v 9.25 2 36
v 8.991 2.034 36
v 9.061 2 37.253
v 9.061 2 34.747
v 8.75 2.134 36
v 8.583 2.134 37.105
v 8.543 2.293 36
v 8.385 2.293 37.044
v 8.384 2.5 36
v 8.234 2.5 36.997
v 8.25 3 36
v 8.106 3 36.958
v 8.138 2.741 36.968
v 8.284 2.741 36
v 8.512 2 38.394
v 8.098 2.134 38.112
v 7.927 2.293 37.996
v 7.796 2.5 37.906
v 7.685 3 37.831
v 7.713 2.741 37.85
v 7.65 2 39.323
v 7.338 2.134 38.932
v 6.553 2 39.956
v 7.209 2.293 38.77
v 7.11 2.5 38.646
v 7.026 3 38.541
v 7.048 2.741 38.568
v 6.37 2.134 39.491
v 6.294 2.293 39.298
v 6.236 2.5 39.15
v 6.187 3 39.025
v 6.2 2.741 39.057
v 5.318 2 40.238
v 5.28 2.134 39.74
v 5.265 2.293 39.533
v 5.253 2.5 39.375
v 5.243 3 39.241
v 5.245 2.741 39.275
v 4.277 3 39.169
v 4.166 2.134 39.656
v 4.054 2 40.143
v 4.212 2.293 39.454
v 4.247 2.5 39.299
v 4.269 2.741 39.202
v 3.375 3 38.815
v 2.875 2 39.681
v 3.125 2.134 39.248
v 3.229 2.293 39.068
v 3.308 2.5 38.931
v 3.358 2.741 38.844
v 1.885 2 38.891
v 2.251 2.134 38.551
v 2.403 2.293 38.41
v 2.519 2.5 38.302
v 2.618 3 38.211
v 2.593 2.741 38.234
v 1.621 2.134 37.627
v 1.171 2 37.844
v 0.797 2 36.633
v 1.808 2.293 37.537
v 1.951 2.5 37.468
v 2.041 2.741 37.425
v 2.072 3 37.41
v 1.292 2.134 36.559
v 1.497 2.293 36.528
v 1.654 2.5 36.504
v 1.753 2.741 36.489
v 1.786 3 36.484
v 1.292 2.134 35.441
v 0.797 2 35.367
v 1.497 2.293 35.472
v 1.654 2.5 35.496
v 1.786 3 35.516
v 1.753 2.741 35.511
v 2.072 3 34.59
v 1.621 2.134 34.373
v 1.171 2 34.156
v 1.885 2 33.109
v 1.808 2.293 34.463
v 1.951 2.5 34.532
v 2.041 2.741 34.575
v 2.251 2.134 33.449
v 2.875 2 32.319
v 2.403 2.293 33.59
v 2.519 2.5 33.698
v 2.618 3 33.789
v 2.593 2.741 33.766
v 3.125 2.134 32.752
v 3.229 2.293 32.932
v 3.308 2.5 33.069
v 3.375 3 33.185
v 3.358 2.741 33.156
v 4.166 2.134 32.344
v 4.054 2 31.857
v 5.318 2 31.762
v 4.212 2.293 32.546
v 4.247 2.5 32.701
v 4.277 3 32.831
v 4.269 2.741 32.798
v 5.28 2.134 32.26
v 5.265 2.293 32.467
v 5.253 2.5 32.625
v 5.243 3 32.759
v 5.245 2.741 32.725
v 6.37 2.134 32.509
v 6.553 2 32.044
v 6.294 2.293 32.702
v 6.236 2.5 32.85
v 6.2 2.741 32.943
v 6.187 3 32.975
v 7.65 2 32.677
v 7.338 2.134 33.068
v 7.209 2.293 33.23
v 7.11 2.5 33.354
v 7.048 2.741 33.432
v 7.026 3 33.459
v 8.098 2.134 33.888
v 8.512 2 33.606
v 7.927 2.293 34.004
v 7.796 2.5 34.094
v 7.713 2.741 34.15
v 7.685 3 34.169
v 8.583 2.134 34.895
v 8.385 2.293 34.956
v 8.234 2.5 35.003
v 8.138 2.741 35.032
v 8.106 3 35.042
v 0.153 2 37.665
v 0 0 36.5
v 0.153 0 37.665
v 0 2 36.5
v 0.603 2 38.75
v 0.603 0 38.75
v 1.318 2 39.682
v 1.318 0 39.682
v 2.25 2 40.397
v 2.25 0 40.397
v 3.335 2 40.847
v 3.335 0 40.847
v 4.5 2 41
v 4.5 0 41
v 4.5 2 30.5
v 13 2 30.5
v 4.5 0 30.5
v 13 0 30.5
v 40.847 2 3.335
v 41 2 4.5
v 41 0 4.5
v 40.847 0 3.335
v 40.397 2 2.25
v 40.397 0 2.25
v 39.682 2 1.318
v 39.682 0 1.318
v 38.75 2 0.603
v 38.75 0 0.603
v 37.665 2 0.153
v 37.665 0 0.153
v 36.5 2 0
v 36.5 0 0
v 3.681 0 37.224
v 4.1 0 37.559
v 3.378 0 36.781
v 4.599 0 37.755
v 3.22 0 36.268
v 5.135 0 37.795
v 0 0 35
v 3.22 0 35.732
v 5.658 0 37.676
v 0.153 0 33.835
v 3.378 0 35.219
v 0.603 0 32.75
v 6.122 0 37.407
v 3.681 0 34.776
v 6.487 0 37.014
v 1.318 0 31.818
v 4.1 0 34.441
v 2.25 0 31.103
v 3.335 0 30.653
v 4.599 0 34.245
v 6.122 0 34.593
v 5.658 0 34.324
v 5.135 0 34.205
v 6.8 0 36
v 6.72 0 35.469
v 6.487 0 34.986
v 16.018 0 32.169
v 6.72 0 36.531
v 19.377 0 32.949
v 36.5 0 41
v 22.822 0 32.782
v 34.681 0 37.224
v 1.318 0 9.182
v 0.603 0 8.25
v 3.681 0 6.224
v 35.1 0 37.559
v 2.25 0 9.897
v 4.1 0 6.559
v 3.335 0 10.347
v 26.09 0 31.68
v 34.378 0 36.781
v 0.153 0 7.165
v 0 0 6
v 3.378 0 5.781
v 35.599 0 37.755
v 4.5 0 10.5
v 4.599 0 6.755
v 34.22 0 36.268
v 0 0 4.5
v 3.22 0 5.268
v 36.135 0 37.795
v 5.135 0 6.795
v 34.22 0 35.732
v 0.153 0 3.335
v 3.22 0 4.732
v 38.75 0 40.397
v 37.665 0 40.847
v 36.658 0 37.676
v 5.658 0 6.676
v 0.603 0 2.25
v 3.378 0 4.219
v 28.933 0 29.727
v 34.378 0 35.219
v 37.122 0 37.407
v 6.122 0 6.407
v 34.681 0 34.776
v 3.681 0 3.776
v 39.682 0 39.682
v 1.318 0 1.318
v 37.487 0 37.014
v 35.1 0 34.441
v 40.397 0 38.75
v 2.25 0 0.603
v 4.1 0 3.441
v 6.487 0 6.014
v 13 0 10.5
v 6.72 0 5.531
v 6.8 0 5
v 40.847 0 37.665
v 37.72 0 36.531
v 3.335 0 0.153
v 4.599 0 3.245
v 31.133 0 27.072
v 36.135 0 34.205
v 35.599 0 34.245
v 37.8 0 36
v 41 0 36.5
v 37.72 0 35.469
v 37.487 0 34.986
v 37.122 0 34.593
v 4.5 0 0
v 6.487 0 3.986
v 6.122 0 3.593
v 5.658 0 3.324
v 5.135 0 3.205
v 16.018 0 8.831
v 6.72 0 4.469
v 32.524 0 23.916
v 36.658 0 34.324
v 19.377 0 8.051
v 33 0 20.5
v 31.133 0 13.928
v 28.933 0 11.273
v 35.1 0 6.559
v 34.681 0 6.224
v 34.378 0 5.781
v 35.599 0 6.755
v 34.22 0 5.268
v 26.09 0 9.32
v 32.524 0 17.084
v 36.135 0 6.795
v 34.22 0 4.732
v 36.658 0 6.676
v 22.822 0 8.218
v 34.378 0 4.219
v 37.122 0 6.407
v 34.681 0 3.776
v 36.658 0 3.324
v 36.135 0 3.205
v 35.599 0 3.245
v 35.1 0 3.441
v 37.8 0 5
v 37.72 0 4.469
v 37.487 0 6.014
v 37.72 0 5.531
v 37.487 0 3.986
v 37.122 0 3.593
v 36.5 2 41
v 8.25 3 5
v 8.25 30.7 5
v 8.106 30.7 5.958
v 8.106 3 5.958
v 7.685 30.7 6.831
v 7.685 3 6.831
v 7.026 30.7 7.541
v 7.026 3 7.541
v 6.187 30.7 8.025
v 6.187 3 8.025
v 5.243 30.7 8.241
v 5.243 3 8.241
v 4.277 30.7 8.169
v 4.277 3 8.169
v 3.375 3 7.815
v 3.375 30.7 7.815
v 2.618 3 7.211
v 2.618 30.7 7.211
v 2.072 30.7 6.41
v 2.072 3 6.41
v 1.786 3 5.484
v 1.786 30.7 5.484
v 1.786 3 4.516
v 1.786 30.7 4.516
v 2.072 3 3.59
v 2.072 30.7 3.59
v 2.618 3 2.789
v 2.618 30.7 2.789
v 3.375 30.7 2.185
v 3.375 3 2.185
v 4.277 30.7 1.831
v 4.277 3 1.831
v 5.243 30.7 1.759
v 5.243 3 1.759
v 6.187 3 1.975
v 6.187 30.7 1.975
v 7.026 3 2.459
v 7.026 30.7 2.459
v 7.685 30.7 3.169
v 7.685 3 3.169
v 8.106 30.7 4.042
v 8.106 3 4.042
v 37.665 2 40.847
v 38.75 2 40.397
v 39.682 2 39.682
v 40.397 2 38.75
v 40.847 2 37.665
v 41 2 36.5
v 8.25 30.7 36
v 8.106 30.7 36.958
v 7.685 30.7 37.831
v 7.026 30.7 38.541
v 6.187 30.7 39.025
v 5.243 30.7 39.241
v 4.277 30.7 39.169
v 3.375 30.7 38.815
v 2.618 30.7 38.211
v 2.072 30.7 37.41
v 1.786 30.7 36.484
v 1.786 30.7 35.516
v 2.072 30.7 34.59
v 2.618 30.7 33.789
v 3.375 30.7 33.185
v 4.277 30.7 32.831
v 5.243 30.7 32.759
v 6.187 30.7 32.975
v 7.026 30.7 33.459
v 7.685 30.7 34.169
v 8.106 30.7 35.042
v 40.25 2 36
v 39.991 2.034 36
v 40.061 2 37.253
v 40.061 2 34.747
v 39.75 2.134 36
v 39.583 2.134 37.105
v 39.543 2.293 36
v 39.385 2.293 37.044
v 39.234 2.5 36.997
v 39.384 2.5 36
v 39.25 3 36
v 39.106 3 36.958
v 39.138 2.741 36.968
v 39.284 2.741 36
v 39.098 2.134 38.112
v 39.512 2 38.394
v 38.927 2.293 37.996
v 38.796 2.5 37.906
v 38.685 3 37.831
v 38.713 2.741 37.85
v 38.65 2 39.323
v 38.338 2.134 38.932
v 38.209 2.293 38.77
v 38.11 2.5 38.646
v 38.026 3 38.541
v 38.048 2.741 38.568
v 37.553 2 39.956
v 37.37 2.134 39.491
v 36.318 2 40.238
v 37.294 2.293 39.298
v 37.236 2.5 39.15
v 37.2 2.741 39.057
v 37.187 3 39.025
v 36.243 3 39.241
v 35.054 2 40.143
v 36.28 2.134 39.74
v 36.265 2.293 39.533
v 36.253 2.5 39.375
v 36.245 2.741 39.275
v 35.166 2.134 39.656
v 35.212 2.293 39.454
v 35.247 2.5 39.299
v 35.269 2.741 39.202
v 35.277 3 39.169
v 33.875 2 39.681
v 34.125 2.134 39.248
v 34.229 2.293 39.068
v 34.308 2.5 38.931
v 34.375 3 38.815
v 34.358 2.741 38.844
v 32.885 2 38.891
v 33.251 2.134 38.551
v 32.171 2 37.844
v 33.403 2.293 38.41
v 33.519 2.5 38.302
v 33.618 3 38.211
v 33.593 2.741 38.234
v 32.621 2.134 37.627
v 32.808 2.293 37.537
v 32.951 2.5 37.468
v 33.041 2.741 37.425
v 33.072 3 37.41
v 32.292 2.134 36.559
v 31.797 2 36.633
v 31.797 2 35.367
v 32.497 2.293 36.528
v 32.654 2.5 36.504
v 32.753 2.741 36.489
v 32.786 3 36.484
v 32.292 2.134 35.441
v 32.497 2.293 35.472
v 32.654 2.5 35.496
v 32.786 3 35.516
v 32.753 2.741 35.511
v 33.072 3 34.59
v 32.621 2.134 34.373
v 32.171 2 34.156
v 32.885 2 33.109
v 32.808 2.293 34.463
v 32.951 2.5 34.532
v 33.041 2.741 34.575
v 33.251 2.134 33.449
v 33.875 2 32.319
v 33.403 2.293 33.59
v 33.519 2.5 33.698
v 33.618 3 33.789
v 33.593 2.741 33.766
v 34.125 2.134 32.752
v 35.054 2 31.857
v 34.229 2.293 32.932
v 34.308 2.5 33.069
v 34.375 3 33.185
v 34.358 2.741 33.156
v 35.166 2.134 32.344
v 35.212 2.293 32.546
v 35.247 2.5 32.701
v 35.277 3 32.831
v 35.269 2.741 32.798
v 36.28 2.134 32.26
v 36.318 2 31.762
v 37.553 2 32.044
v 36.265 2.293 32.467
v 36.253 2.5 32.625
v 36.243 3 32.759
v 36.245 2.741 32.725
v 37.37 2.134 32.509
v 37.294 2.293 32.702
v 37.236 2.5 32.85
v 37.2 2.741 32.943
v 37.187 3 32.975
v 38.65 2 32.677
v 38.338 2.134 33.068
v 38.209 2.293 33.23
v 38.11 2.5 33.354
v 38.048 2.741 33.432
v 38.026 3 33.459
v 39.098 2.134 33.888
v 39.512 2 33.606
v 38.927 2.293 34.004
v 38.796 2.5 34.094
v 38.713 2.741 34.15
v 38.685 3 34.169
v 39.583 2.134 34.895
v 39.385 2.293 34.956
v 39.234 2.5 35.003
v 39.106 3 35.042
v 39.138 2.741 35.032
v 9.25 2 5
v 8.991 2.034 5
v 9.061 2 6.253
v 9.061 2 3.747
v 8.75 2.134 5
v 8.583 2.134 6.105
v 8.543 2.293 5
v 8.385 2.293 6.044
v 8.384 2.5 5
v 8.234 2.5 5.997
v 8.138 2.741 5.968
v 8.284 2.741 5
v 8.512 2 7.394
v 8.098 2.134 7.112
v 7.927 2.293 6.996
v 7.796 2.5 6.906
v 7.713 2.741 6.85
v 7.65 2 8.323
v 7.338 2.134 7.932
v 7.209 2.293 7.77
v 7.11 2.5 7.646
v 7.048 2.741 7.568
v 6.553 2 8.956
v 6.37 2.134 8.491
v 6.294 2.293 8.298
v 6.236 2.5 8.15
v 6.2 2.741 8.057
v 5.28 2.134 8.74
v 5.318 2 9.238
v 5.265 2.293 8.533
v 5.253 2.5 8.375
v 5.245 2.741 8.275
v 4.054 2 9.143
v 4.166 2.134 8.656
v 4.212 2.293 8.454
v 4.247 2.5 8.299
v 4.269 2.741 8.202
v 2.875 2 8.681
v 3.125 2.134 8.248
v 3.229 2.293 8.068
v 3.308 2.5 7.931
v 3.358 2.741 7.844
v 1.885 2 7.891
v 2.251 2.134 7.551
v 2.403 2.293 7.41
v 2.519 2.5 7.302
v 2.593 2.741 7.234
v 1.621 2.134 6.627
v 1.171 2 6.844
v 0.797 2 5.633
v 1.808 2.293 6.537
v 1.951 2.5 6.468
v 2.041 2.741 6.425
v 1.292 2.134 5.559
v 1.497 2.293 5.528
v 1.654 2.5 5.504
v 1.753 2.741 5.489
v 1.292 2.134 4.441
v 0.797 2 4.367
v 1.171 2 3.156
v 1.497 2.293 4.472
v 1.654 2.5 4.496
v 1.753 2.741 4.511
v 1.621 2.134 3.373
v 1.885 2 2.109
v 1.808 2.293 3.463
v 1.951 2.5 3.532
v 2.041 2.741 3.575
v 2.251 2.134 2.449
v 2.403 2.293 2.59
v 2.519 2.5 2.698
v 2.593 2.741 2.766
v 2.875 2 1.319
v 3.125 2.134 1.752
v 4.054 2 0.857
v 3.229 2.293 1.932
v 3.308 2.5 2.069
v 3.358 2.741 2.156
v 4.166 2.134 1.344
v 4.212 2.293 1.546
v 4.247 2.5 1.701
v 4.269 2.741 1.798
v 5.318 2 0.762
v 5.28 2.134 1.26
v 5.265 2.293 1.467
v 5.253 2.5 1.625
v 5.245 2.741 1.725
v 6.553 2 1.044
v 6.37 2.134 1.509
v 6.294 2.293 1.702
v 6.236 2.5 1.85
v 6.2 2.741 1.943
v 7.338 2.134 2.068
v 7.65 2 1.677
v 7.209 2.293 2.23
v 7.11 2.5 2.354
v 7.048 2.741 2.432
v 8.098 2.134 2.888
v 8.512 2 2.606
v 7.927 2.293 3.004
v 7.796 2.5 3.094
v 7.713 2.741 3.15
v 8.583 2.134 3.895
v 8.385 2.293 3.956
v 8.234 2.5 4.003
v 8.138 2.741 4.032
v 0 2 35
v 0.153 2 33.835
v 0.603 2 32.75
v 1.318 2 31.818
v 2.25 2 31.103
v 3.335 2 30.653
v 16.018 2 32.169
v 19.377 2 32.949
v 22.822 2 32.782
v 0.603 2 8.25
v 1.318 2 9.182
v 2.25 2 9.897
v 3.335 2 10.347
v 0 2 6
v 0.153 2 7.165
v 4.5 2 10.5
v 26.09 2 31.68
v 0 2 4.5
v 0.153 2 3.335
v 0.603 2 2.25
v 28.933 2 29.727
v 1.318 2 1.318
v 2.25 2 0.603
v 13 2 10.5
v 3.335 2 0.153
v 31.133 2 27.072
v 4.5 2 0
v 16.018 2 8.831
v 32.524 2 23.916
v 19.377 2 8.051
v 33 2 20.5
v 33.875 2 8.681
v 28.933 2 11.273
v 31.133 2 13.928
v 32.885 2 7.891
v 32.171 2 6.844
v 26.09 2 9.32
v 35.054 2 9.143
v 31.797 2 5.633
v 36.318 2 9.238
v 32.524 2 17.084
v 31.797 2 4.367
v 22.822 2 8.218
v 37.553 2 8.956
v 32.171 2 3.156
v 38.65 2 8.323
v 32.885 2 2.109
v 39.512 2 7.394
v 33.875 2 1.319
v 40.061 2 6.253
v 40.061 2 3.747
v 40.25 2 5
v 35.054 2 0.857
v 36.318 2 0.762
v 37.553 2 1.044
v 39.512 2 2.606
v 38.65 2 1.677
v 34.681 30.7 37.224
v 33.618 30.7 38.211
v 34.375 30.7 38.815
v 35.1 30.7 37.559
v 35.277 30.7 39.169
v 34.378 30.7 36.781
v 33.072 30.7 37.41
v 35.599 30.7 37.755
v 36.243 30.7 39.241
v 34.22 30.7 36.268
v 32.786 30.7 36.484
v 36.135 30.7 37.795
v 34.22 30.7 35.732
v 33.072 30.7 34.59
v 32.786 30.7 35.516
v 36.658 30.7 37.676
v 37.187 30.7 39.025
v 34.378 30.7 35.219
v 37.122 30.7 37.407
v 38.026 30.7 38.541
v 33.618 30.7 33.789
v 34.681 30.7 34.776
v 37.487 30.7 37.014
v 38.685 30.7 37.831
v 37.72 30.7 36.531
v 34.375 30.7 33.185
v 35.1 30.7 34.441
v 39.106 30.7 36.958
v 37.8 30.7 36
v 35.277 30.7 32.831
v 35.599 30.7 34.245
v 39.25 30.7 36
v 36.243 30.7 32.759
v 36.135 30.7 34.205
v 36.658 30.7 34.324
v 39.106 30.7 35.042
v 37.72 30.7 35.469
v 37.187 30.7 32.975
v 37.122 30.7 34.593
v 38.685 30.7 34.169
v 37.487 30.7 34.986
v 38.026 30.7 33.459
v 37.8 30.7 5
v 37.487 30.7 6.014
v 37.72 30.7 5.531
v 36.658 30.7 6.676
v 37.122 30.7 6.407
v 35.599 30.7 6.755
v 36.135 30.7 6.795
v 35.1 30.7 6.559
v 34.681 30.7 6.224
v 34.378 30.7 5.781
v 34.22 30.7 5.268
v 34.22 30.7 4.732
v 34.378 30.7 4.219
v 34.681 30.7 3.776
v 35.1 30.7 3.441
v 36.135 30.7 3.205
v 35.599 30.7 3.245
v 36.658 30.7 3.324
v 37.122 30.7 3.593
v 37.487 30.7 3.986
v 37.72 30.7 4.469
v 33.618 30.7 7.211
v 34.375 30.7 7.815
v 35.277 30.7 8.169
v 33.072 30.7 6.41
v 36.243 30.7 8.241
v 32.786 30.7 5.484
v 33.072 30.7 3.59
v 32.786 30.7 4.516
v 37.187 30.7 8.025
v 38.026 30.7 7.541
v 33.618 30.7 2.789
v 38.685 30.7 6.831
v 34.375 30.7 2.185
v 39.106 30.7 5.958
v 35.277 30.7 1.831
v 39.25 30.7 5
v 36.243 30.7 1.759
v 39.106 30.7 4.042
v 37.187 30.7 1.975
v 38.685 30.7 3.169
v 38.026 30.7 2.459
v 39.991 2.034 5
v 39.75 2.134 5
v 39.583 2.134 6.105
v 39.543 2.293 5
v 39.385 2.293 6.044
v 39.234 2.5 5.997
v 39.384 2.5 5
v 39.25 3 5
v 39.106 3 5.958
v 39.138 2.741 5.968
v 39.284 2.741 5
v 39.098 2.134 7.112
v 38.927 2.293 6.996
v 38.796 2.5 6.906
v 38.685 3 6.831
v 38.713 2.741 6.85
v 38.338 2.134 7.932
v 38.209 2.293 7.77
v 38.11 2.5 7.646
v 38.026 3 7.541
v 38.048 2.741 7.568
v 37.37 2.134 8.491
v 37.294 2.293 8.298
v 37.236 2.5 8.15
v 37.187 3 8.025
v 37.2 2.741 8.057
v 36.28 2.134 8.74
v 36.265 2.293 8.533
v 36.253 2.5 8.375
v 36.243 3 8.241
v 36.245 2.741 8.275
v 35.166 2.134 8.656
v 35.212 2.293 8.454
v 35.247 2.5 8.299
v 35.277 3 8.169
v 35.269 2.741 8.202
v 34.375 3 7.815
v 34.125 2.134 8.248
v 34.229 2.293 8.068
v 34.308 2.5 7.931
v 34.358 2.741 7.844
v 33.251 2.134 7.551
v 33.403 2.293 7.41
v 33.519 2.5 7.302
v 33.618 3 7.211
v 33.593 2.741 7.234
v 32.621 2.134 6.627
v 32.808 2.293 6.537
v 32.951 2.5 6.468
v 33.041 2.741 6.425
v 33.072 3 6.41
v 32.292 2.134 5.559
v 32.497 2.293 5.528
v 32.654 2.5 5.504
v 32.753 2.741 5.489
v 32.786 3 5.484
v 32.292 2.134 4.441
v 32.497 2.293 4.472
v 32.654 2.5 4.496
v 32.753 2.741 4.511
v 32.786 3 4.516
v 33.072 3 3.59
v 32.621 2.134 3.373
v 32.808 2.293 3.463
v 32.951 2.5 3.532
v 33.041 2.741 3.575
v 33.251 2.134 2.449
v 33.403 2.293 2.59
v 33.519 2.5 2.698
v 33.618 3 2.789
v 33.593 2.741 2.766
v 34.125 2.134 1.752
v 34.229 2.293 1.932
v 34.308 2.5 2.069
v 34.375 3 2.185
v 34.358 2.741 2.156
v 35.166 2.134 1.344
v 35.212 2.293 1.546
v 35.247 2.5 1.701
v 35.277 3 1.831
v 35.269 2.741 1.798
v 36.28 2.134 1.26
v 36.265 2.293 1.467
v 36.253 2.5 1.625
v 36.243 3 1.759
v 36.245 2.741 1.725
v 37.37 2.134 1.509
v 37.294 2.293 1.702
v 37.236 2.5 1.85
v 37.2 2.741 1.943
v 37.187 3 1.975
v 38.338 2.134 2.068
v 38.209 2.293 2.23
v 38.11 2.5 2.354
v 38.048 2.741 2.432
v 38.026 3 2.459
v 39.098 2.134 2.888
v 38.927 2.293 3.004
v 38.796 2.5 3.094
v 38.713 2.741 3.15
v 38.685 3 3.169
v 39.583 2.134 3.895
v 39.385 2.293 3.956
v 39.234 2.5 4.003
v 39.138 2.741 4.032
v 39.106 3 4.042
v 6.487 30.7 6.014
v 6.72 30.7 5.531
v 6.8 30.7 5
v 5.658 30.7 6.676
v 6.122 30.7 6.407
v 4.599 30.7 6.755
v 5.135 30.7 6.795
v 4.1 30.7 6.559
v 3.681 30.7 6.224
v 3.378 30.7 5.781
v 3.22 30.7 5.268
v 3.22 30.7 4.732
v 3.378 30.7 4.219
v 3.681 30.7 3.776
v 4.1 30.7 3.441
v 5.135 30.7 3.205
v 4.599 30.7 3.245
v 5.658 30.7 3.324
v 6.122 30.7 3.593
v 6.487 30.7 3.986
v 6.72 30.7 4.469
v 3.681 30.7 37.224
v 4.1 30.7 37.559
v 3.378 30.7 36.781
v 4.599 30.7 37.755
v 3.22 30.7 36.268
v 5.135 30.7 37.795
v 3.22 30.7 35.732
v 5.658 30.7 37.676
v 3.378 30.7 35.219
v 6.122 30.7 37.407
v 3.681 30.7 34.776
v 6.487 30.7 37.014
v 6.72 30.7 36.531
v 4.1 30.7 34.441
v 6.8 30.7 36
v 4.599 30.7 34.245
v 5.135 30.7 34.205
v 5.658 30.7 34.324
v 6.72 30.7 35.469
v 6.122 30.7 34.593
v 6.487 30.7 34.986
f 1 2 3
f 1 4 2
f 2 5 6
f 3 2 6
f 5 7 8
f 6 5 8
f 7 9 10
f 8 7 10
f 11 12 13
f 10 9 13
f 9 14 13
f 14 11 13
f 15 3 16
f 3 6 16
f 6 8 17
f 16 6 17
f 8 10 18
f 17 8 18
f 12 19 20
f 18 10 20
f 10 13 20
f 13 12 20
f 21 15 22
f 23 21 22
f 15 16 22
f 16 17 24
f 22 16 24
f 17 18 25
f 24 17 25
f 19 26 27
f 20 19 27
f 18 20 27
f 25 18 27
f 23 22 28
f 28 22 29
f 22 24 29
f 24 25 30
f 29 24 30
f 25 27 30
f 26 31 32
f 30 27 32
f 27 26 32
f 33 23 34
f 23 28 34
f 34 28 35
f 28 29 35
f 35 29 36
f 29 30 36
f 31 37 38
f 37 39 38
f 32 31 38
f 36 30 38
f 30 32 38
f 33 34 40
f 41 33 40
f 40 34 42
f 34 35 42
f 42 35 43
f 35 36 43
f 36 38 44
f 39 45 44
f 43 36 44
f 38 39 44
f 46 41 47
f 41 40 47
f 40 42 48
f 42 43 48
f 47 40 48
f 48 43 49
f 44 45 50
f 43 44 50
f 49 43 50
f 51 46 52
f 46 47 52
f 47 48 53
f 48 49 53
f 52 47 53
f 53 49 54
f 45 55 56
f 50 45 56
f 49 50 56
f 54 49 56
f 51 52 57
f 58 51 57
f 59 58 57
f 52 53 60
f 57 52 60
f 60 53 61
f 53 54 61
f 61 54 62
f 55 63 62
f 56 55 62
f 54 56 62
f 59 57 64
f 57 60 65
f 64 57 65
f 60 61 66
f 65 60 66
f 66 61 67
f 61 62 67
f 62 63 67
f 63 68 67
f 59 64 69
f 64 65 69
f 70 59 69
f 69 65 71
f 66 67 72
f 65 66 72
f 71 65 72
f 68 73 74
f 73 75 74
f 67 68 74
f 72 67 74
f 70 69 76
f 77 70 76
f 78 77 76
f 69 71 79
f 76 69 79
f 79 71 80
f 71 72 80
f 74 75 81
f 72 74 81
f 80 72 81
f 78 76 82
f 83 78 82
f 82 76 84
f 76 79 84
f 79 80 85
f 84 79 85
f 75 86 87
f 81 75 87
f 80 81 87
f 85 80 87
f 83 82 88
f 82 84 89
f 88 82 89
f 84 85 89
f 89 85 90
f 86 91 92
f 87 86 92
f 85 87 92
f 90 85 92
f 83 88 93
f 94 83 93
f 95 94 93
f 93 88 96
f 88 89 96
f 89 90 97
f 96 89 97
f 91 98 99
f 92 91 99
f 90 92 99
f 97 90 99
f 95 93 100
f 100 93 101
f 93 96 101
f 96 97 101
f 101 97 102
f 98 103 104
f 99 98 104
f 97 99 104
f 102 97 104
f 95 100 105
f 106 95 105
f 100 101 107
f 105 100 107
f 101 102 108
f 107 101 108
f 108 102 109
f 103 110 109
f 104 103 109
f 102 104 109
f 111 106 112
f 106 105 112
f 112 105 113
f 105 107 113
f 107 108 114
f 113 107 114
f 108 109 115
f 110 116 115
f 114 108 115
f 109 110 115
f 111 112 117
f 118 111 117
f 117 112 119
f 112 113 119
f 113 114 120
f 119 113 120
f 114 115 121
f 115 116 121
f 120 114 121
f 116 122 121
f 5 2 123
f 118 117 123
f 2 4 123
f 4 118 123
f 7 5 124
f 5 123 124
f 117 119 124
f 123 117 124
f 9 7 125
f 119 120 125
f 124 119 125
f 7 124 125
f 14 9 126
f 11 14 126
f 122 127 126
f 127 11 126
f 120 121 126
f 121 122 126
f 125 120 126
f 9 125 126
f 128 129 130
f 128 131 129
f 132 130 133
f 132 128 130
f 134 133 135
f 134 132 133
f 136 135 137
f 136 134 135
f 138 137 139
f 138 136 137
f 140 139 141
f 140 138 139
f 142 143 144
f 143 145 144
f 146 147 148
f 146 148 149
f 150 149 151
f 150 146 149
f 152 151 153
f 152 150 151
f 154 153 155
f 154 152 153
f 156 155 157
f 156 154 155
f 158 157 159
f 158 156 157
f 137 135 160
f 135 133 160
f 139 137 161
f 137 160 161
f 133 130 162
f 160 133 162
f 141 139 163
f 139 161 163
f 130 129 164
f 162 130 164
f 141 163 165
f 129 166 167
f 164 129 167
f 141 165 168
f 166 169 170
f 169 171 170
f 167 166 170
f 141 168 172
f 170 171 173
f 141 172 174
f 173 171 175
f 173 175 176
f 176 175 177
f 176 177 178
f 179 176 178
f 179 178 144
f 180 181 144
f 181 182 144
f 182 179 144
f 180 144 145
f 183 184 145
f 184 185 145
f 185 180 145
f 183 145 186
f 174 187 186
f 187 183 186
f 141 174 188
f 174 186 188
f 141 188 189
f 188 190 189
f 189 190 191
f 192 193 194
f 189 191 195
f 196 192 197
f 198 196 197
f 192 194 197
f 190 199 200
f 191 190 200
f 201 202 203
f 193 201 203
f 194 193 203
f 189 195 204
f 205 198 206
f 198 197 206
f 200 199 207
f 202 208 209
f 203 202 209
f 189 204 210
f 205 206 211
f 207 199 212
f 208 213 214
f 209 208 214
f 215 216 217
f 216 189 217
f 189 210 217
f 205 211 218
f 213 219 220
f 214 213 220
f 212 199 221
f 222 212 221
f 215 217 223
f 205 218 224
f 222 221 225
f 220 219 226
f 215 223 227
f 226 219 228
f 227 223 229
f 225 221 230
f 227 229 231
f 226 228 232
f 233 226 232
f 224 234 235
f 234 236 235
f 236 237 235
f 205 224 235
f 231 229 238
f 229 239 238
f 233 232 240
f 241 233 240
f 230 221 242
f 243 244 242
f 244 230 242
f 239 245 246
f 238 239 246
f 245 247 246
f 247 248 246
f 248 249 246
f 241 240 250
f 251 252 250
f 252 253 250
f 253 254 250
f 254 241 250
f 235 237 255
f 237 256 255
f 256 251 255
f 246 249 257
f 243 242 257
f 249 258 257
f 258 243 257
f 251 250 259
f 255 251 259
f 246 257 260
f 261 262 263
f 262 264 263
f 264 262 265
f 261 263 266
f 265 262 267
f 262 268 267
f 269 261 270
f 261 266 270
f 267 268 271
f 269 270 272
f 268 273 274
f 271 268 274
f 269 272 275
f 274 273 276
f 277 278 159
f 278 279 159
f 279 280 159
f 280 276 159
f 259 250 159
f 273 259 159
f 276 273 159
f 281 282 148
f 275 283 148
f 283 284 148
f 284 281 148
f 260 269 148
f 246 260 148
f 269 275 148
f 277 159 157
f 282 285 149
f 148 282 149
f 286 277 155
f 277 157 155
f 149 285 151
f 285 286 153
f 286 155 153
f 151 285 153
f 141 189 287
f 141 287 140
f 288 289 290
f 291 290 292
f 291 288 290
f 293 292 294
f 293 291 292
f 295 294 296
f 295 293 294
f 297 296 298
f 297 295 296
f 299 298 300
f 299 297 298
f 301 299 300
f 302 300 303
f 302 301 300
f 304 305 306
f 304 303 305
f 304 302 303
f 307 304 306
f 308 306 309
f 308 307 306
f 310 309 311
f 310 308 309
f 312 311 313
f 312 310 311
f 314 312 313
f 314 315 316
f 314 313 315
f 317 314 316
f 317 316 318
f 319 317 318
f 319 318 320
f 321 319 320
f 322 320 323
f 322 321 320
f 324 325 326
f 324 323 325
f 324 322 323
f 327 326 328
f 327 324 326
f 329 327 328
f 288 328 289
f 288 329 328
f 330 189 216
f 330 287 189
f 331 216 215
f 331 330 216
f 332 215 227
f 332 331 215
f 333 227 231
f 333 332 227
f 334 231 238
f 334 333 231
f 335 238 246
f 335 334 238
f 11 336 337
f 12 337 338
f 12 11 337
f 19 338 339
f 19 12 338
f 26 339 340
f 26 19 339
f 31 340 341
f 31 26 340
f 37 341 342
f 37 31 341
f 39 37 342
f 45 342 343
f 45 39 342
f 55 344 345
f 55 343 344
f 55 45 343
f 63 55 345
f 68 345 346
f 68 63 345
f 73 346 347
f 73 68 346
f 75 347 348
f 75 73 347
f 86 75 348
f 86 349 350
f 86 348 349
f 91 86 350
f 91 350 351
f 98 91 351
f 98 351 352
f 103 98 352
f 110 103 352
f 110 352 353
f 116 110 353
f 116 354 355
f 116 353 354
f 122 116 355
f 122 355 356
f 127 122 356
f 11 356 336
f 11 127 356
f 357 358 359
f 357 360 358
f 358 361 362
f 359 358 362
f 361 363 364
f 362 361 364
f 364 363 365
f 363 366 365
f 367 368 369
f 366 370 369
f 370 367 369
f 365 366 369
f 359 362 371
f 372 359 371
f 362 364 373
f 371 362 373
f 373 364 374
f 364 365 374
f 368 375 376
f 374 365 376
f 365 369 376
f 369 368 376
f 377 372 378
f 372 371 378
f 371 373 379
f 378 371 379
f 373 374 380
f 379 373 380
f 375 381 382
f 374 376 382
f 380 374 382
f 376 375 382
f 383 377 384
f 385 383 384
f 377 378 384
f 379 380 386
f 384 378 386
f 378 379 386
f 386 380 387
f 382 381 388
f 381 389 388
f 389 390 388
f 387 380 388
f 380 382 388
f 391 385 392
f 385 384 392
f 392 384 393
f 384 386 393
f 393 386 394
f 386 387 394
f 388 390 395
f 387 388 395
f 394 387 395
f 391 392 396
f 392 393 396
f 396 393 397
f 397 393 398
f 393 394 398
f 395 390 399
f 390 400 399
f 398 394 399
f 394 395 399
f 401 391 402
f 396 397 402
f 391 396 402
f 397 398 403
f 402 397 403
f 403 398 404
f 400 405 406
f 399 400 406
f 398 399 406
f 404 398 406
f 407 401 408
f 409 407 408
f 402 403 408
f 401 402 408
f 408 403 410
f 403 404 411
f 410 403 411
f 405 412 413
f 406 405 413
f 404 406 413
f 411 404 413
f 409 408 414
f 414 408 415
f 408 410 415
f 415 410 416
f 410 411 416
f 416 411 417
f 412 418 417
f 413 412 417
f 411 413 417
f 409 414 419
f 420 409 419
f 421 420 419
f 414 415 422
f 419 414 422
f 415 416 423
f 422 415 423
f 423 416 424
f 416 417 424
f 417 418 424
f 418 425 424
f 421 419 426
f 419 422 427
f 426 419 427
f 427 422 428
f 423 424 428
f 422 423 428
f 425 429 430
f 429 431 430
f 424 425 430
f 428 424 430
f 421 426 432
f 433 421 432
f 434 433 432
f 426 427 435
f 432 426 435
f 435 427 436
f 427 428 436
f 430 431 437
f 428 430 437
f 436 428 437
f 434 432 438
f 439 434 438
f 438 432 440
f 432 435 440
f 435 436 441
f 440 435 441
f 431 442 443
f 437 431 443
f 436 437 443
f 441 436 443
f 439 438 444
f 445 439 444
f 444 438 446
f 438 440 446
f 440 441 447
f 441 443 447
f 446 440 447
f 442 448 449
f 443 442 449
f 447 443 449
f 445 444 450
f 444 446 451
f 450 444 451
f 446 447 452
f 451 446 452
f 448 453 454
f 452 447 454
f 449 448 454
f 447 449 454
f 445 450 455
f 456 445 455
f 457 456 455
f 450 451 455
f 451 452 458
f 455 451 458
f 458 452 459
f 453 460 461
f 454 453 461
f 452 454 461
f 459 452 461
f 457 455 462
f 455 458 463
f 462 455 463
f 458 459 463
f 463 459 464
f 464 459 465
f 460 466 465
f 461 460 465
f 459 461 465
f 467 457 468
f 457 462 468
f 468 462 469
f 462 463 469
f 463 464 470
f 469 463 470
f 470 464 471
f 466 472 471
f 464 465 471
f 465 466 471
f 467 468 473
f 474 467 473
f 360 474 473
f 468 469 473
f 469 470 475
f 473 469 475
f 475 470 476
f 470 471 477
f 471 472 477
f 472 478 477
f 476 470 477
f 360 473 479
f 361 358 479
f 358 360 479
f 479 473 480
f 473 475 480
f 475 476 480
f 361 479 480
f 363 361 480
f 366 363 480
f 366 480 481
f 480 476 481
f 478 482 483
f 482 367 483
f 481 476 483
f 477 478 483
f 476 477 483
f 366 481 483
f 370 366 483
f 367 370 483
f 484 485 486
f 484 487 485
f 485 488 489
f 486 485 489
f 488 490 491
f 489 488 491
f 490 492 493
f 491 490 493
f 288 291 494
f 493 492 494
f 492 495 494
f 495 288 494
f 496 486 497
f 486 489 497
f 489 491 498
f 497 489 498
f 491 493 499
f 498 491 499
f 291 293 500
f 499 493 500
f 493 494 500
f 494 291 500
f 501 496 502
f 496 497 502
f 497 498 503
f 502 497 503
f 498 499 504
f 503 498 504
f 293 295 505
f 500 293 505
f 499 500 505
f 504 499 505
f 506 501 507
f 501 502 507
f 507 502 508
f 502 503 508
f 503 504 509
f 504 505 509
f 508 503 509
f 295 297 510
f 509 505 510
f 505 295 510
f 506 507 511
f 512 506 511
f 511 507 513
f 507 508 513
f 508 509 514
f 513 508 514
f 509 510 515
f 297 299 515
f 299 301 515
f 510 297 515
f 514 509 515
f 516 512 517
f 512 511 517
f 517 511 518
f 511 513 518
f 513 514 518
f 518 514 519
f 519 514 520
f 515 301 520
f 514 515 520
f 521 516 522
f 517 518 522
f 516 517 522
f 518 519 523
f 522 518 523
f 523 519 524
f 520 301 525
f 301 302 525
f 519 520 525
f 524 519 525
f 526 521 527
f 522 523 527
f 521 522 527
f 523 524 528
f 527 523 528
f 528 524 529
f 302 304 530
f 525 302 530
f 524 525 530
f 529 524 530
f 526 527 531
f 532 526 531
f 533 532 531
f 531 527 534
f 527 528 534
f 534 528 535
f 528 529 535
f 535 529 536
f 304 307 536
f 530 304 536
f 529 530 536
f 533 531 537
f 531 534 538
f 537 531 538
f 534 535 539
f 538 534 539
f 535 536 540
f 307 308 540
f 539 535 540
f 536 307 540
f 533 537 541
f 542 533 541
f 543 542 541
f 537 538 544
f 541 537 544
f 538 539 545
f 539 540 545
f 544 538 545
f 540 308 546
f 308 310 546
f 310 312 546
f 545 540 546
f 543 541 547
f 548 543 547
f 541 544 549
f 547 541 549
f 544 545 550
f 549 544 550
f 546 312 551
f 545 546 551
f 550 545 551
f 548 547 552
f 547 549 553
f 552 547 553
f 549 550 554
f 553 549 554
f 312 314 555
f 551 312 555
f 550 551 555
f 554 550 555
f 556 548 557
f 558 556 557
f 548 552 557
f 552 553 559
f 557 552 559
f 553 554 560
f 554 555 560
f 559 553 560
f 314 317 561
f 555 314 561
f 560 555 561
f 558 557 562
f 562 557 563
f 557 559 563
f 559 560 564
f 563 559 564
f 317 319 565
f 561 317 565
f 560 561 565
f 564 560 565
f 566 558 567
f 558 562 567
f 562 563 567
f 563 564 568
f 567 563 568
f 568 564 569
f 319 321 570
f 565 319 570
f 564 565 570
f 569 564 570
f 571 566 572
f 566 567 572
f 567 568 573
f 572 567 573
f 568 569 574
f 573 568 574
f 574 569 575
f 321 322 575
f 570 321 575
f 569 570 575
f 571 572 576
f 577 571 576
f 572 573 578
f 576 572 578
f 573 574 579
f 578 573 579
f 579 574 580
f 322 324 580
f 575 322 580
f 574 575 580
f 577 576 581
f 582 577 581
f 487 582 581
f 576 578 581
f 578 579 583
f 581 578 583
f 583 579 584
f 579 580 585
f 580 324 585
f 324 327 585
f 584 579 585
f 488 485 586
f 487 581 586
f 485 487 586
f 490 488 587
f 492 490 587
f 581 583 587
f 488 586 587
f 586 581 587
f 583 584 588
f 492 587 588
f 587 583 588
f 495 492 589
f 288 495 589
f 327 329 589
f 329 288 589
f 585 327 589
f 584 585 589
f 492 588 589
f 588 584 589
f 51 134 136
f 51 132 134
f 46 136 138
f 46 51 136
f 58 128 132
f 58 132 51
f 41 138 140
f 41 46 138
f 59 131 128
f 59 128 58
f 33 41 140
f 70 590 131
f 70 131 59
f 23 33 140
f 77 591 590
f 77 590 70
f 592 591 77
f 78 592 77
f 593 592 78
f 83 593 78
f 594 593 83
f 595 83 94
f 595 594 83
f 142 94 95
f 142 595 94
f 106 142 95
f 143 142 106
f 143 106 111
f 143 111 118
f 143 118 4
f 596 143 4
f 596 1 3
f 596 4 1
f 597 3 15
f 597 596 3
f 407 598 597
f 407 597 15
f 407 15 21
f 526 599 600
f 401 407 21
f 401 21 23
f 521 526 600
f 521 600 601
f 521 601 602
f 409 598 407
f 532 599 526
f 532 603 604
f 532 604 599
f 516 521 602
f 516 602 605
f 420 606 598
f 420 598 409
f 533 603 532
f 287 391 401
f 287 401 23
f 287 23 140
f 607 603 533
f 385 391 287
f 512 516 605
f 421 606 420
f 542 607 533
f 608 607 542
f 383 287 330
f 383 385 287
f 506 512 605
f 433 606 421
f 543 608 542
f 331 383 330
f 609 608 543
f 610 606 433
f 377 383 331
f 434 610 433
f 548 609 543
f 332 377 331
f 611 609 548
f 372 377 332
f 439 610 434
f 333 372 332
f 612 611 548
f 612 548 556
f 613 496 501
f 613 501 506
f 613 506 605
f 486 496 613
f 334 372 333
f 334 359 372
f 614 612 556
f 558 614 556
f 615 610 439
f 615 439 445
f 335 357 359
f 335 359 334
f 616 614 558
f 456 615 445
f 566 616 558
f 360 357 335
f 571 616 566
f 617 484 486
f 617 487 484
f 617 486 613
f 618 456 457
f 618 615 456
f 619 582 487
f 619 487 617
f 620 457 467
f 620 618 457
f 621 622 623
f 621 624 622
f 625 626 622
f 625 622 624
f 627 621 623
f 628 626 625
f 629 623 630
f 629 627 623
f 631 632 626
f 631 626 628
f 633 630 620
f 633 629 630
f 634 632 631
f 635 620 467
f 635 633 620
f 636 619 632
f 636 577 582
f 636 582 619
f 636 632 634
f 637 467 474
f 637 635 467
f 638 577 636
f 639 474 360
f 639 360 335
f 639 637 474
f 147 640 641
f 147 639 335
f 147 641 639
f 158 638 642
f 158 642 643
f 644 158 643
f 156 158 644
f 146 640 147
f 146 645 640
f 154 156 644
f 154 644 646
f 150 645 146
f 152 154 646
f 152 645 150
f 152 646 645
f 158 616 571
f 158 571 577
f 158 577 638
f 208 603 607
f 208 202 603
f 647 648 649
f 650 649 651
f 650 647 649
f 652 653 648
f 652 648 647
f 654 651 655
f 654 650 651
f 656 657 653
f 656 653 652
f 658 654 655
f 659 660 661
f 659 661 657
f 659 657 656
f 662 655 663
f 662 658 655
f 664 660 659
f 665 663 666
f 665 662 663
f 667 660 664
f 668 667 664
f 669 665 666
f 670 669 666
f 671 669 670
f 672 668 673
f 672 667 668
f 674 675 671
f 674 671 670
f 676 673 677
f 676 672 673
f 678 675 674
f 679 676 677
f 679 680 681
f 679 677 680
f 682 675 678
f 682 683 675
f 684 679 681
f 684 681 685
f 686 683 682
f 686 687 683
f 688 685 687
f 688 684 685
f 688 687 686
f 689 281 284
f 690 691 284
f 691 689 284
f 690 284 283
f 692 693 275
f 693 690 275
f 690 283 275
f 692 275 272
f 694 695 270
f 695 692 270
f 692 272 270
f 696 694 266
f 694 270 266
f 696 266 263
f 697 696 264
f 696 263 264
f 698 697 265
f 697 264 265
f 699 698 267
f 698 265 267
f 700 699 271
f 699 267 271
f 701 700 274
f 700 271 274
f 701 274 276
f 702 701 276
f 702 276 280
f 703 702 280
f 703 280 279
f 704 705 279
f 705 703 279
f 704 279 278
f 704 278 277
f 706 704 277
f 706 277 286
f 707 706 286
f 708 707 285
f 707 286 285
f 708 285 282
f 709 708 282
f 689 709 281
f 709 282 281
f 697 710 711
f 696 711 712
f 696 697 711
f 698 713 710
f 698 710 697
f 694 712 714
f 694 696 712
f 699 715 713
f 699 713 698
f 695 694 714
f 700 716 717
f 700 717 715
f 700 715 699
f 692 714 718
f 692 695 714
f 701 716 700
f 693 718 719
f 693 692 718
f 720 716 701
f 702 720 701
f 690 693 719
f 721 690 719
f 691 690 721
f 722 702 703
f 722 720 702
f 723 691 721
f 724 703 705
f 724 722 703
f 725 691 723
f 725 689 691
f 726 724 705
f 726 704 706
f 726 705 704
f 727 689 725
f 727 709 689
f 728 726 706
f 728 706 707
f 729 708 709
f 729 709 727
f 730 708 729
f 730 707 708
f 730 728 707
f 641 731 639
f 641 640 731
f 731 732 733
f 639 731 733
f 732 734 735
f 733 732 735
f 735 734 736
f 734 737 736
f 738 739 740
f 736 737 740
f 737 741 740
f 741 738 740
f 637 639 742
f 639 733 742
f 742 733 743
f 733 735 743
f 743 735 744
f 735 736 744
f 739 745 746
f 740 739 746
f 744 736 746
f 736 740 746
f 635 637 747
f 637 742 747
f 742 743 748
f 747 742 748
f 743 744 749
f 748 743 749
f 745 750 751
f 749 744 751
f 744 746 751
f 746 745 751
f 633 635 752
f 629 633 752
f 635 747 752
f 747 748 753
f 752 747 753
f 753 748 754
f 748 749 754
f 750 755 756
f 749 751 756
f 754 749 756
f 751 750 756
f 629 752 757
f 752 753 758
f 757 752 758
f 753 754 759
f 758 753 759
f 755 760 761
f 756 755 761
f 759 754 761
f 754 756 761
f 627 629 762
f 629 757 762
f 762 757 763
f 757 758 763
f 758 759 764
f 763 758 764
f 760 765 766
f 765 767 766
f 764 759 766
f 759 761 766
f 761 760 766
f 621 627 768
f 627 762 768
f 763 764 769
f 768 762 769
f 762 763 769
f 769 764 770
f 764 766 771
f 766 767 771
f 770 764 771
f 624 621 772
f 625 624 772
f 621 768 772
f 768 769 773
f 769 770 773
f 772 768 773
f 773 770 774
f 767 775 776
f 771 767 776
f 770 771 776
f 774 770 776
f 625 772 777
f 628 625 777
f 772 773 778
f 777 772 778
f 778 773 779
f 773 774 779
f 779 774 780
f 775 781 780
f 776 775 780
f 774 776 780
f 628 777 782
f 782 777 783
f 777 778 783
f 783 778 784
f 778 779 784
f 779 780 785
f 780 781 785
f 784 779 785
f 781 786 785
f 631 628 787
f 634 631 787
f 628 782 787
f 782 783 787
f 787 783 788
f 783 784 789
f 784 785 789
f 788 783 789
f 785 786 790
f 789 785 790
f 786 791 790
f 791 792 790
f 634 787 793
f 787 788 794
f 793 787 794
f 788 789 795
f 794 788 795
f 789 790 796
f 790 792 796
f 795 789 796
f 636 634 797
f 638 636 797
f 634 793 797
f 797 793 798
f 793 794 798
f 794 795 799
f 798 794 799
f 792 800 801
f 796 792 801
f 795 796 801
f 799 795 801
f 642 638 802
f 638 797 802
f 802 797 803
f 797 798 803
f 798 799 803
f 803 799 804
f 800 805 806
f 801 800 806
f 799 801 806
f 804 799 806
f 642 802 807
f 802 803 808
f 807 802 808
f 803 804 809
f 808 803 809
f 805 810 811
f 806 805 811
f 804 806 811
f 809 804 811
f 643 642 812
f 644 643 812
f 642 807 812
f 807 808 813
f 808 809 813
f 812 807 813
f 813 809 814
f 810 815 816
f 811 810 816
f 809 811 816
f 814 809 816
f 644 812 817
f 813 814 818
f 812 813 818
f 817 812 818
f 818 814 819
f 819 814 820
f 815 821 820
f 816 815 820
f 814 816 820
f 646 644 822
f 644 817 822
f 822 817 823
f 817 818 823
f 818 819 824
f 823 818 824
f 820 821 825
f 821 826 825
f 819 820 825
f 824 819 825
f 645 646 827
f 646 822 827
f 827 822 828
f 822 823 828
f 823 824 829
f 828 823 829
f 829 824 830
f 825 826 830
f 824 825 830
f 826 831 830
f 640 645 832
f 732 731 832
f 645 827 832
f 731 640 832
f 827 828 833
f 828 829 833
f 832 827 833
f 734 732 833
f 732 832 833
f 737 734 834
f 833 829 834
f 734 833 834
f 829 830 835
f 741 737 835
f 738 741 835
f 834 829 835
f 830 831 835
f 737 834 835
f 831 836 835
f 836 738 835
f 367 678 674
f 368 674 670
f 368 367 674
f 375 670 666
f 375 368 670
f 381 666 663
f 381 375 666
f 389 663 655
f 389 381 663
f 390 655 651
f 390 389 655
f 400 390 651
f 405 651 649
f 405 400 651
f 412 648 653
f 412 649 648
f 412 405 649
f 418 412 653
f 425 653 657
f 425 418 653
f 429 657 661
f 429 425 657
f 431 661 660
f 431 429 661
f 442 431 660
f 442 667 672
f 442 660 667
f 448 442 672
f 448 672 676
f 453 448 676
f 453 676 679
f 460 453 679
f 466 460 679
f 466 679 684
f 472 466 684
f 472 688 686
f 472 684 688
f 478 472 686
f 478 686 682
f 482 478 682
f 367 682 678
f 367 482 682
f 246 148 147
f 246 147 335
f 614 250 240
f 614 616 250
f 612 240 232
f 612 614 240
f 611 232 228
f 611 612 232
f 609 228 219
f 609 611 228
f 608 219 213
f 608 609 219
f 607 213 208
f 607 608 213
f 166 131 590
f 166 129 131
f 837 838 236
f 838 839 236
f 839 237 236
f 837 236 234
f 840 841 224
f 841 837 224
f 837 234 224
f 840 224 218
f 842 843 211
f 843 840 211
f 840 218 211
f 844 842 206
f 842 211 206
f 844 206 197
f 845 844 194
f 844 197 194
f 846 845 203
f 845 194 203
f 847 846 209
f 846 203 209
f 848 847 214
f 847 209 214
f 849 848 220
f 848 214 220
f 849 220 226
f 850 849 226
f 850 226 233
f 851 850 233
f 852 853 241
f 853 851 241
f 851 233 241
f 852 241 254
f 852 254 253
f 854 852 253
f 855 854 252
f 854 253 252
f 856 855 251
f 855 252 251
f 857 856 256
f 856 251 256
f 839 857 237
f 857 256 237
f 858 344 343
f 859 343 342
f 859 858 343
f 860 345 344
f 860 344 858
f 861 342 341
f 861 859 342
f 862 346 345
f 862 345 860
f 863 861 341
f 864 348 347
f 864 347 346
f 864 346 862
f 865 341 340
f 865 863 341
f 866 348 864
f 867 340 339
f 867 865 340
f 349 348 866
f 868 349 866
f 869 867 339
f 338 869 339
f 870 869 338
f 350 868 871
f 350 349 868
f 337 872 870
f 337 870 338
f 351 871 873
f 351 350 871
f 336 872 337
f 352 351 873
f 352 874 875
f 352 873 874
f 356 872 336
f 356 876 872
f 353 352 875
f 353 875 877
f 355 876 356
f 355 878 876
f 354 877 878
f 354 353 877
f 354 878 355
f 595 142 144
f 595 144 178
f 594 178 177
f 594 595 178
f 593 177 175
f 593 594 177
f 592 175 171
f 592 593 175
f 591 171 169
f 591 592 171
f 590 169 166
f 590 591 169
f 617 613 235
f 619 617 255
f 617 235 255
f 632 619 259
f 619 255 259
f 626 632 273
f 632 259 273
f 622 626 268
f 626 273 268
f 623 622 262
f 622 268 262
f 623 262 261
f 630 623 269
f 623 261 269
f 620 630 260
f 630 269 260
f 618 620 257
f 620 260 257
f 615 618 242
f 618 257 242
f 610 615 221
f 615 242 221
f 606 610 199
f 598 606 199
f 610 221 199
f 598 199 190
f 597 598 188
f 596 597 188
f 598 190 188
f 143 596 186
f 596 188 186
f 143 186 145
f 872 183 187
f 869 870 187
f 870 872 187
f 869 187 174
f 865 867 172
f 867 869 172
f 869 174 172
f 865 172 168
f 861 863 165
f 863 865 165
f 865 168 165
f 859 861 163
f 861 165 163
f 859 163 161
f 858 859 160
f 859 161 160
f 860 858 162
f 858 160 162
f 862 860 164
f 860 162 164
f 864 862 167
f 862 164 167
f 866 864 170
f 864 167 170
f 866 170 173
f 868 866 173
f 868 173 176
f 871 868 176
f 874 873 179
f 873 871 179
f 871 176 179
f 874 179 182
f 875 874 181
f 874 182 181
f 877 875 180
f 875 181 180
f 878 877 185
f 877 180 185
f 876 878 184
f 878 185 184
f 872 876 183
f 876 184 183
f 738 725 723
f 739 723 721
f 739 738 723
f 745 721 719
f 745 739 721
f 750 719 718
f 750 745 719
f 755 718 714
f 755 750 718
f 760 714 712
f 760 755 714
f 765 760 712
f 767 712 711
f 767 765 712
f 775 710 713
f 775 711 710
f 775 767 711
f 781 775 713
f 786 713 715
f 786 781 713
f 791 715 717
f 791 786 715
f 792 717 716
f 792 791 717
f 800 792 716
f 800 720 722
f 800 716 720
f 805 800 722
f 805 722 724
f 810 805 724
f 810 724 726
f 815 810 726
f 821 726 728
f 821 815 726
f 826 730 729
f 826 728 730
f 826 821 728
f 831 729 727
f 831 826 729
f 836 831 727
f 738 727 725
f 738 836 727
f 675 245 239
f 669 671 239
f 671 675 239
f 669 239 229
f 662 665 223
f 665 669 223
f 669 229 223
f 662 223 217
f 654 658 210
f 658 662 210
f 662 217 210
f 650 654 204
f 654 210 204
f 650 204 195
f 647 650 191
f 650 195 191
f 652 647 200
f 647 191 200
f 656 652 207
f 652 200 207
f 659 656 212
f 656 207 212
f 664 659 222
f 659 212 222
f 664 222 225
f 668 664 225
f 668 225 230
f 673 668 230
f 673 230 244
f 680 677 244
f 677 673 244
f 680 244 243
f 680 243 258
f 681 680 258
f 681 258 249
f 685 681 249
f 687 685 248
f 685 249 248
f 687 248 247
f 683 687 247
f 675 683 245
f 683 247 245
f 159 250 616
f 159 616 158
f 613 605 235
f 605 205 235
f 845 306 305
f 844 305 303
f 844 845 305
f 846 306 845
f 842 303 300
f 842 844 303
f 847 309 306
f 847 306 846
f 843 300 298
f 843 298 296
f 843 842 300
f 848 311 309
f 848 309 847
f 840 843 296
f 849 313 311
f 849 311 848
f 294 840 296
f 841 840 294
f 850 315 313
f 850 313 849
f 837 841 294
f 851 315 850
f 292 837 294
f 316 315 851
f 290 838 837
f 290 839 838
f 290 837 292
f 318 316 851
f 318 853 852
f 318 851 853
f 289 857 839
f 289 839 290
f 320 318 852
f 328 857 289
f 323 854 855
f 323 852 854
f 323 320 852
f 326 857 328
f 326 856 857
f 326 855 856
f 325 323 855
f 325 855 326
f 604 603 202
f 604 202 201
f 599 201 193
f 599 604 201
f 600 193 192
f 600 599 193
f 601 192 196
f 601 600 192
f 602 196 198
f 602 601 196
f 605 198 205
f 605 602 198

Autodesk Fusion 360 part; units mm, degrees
sketch "Sketch1" plane through (0, 0, 0) normal (0, 1, 0) x (1, 0, 0)
  line L0 (0, 0) -> (41, 0)
  line L1 (41, 0) -> (41, -41)
  line L2 (41, -41) -> (0, -41)
  line L3 (0, -41) -> (0, 0)
  line L4 (0, -20.5) -> (41, -20.5) construction
  line L5 (20.5, 0) -> (20.5, -41) construction
  circle A0 centre (20.5, -20.5) radius 12.5
  line L6 (36, -36) -> (5, -36) construction
  line L7 (5, -36) -> (5, -5) construction
  line L8 (5, -5) -> (36, -5) construction
  line L9 (36, -5) -> (36, -36) construction
  line L10 (36, -36) -> (5, -5) construction
  line L11 (5, -36) -> (36, -5) construction
  circle A1 centre (5, -36) radius 1.8
  circle A2 centre (36, -36) radius 1.8
  circle A3 centre (36, -5) radius 1.8
  circle A4 centre (5, -5) radius 1.8
  circle A5 centre (5, -36) radius 3.25
  circle A6 centre (36, -36) radius 3.25
  circle A7 centre (36, -5) radius 3.25
  circle A8 centre (5, -5) radius 3.25
  line L12 (0, -10.5) -> (13, -10.5)
  line L13 (13, -30.5) -> (0, -30.5)
  point P0 (20.5, -20.5)
  dimension "d1" = 31
  dimension "d2" = 31
  dimension "d3" = 25
  dimension "d4" = 3.6
  dimension "d5" = 3.6
  dimension "d6" = 3.6
  dimension "d7" = 3.6
  dimension "d8" = 6.5
  dimension "d9" = 6.5
  dimension "d10" = 6.5
  dimension "d11" = 6.5
  dimension "d12" = 41
  dimension "d13" = 10
  dimension "d14" = 10
extrude "Extrude1" add sketch "Sketch1" along normal blind 2 contours L0 L1 L2 L3 A0 L12 L13 | A5 | A6 | A7 | A8
extrude "Extrude2" add sketch "Sketch1" along normal blind 30.7 contours A5 | A6 | A7 | A8
ref_plane "WorkPlane1" through (20.5, 1, 20.5) normal (0, 0, 1) x (1, 0, 0)
fillet "Fillet1" radius 1 4 edges at (32.9699, 2, 34.8247) (32.9699, 2, 3.8247) (1.9699, 2, 3.8247) (1.9699, 2, 34.8247)
fillet "Fillet2" radius 4.5 6 edges at (41, 1, 0) (41, 1, 41) (0, 1, 0) (0, 1, 41) (0, 1, 10.5) (0, 1, 30.5)
equation "d2 = d1"
equation "d5 = d4"
equation "d6 = d5"
equation "d7 = d4"
equation "d9 = d8"
equation "d10 = d8"
equation "d11 = d8"
equation "d14 = d13"
equation "Hoogte = 30.7 mm"
equation "d18 = Hoogte"
equation "d20 = ( -41 / 2 ) * 1 mm"
